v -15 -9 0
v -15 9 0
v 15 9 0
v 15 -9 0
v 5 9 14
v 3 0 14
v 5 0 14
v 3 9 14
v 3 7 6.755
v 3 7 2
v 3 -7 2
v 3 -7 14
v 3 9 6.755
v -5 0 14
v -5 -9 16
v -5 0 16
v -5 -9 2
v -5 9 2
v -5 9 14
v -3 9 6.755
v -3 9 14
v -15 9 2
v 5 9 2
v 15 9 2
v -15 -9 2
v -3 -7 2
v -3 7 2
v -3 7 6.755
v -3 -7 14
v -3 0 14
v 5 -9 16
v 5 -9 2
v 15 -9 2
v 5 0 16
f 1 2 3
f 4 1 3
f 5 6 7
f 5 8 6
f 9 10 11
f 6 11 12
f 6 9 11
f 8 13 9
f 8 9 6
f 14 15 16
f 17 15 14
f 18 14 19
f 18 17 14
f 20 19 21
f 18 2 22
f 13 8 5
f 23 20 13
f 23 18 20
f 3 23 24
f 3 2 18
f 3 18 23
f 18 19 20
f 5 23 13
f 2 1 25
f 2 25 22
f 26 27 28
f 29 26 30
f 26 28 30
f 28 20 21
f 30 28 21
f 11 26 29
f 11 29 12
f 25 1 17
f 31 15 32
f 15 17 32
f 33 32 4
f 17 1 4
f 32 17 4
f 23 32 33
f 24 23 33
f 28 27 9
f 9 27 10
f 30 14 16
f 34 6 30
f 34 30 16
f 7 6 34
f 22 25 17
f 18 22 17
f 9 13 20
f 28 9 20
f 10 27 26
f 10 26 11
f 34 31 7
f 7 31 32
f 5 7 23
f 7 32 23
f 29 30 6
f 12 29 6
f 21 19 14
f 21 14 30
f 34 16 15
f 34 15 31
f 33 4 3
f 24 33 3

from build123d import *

# Parameters (mm, degrees)
F0_W      = 30
F0_H      = 18
F1_DEPTH  = 2
F3_W      = 10
F3_H      = 18
F3_W_2    = 6
F3_H_2    = 14
F4_DEPTH  = 12
F6_W      = 6
F6_H      = 7.2452436302
F7_DEPTH  = 4
F9_W      = 10
F9_H      = 9
F10_DEPTH = 2


with BuildPart() as f1:
    # F0 (on Top) → F1 (new body)
    with BuildSketch(Plane.XY):
        Rectangle(F0_W, F0_H)
    extrude(amount=F1_DEPTH)

    # F3 (on offset) → F4 (join)
    with BuildSketch(Plane.XY.offset(2)):
        Rectangle(F3_W, F3_H)
        Rectangle(F3_W_2, F3_H_2, mode=Mode.SUBTRACT)
    extrude(amount=F4_DEPTH)

    # F6 (on offset) → F7 (cut)
    with BuildSketch(Plane(origin=(0, 9, 0), x_dir=(-1, 0, 0), z_dir=(0, 1, 0))):
        with Locations((0, 10.3773781849)):
            Rectangle(F6_W, F6_H)
    extrude(amount=-F7_DEPTH, mode=Mode.SUBTRACT)

    # F9 (on offset) → F10 (join)
    with BuildSketch(Plane.XY.offset(14)):
        with Locations((0, -4.5)):
            Rectangle(F9_W, F9_H)
    extrude(amount=F10_DEPTH)


solid = f1.part
